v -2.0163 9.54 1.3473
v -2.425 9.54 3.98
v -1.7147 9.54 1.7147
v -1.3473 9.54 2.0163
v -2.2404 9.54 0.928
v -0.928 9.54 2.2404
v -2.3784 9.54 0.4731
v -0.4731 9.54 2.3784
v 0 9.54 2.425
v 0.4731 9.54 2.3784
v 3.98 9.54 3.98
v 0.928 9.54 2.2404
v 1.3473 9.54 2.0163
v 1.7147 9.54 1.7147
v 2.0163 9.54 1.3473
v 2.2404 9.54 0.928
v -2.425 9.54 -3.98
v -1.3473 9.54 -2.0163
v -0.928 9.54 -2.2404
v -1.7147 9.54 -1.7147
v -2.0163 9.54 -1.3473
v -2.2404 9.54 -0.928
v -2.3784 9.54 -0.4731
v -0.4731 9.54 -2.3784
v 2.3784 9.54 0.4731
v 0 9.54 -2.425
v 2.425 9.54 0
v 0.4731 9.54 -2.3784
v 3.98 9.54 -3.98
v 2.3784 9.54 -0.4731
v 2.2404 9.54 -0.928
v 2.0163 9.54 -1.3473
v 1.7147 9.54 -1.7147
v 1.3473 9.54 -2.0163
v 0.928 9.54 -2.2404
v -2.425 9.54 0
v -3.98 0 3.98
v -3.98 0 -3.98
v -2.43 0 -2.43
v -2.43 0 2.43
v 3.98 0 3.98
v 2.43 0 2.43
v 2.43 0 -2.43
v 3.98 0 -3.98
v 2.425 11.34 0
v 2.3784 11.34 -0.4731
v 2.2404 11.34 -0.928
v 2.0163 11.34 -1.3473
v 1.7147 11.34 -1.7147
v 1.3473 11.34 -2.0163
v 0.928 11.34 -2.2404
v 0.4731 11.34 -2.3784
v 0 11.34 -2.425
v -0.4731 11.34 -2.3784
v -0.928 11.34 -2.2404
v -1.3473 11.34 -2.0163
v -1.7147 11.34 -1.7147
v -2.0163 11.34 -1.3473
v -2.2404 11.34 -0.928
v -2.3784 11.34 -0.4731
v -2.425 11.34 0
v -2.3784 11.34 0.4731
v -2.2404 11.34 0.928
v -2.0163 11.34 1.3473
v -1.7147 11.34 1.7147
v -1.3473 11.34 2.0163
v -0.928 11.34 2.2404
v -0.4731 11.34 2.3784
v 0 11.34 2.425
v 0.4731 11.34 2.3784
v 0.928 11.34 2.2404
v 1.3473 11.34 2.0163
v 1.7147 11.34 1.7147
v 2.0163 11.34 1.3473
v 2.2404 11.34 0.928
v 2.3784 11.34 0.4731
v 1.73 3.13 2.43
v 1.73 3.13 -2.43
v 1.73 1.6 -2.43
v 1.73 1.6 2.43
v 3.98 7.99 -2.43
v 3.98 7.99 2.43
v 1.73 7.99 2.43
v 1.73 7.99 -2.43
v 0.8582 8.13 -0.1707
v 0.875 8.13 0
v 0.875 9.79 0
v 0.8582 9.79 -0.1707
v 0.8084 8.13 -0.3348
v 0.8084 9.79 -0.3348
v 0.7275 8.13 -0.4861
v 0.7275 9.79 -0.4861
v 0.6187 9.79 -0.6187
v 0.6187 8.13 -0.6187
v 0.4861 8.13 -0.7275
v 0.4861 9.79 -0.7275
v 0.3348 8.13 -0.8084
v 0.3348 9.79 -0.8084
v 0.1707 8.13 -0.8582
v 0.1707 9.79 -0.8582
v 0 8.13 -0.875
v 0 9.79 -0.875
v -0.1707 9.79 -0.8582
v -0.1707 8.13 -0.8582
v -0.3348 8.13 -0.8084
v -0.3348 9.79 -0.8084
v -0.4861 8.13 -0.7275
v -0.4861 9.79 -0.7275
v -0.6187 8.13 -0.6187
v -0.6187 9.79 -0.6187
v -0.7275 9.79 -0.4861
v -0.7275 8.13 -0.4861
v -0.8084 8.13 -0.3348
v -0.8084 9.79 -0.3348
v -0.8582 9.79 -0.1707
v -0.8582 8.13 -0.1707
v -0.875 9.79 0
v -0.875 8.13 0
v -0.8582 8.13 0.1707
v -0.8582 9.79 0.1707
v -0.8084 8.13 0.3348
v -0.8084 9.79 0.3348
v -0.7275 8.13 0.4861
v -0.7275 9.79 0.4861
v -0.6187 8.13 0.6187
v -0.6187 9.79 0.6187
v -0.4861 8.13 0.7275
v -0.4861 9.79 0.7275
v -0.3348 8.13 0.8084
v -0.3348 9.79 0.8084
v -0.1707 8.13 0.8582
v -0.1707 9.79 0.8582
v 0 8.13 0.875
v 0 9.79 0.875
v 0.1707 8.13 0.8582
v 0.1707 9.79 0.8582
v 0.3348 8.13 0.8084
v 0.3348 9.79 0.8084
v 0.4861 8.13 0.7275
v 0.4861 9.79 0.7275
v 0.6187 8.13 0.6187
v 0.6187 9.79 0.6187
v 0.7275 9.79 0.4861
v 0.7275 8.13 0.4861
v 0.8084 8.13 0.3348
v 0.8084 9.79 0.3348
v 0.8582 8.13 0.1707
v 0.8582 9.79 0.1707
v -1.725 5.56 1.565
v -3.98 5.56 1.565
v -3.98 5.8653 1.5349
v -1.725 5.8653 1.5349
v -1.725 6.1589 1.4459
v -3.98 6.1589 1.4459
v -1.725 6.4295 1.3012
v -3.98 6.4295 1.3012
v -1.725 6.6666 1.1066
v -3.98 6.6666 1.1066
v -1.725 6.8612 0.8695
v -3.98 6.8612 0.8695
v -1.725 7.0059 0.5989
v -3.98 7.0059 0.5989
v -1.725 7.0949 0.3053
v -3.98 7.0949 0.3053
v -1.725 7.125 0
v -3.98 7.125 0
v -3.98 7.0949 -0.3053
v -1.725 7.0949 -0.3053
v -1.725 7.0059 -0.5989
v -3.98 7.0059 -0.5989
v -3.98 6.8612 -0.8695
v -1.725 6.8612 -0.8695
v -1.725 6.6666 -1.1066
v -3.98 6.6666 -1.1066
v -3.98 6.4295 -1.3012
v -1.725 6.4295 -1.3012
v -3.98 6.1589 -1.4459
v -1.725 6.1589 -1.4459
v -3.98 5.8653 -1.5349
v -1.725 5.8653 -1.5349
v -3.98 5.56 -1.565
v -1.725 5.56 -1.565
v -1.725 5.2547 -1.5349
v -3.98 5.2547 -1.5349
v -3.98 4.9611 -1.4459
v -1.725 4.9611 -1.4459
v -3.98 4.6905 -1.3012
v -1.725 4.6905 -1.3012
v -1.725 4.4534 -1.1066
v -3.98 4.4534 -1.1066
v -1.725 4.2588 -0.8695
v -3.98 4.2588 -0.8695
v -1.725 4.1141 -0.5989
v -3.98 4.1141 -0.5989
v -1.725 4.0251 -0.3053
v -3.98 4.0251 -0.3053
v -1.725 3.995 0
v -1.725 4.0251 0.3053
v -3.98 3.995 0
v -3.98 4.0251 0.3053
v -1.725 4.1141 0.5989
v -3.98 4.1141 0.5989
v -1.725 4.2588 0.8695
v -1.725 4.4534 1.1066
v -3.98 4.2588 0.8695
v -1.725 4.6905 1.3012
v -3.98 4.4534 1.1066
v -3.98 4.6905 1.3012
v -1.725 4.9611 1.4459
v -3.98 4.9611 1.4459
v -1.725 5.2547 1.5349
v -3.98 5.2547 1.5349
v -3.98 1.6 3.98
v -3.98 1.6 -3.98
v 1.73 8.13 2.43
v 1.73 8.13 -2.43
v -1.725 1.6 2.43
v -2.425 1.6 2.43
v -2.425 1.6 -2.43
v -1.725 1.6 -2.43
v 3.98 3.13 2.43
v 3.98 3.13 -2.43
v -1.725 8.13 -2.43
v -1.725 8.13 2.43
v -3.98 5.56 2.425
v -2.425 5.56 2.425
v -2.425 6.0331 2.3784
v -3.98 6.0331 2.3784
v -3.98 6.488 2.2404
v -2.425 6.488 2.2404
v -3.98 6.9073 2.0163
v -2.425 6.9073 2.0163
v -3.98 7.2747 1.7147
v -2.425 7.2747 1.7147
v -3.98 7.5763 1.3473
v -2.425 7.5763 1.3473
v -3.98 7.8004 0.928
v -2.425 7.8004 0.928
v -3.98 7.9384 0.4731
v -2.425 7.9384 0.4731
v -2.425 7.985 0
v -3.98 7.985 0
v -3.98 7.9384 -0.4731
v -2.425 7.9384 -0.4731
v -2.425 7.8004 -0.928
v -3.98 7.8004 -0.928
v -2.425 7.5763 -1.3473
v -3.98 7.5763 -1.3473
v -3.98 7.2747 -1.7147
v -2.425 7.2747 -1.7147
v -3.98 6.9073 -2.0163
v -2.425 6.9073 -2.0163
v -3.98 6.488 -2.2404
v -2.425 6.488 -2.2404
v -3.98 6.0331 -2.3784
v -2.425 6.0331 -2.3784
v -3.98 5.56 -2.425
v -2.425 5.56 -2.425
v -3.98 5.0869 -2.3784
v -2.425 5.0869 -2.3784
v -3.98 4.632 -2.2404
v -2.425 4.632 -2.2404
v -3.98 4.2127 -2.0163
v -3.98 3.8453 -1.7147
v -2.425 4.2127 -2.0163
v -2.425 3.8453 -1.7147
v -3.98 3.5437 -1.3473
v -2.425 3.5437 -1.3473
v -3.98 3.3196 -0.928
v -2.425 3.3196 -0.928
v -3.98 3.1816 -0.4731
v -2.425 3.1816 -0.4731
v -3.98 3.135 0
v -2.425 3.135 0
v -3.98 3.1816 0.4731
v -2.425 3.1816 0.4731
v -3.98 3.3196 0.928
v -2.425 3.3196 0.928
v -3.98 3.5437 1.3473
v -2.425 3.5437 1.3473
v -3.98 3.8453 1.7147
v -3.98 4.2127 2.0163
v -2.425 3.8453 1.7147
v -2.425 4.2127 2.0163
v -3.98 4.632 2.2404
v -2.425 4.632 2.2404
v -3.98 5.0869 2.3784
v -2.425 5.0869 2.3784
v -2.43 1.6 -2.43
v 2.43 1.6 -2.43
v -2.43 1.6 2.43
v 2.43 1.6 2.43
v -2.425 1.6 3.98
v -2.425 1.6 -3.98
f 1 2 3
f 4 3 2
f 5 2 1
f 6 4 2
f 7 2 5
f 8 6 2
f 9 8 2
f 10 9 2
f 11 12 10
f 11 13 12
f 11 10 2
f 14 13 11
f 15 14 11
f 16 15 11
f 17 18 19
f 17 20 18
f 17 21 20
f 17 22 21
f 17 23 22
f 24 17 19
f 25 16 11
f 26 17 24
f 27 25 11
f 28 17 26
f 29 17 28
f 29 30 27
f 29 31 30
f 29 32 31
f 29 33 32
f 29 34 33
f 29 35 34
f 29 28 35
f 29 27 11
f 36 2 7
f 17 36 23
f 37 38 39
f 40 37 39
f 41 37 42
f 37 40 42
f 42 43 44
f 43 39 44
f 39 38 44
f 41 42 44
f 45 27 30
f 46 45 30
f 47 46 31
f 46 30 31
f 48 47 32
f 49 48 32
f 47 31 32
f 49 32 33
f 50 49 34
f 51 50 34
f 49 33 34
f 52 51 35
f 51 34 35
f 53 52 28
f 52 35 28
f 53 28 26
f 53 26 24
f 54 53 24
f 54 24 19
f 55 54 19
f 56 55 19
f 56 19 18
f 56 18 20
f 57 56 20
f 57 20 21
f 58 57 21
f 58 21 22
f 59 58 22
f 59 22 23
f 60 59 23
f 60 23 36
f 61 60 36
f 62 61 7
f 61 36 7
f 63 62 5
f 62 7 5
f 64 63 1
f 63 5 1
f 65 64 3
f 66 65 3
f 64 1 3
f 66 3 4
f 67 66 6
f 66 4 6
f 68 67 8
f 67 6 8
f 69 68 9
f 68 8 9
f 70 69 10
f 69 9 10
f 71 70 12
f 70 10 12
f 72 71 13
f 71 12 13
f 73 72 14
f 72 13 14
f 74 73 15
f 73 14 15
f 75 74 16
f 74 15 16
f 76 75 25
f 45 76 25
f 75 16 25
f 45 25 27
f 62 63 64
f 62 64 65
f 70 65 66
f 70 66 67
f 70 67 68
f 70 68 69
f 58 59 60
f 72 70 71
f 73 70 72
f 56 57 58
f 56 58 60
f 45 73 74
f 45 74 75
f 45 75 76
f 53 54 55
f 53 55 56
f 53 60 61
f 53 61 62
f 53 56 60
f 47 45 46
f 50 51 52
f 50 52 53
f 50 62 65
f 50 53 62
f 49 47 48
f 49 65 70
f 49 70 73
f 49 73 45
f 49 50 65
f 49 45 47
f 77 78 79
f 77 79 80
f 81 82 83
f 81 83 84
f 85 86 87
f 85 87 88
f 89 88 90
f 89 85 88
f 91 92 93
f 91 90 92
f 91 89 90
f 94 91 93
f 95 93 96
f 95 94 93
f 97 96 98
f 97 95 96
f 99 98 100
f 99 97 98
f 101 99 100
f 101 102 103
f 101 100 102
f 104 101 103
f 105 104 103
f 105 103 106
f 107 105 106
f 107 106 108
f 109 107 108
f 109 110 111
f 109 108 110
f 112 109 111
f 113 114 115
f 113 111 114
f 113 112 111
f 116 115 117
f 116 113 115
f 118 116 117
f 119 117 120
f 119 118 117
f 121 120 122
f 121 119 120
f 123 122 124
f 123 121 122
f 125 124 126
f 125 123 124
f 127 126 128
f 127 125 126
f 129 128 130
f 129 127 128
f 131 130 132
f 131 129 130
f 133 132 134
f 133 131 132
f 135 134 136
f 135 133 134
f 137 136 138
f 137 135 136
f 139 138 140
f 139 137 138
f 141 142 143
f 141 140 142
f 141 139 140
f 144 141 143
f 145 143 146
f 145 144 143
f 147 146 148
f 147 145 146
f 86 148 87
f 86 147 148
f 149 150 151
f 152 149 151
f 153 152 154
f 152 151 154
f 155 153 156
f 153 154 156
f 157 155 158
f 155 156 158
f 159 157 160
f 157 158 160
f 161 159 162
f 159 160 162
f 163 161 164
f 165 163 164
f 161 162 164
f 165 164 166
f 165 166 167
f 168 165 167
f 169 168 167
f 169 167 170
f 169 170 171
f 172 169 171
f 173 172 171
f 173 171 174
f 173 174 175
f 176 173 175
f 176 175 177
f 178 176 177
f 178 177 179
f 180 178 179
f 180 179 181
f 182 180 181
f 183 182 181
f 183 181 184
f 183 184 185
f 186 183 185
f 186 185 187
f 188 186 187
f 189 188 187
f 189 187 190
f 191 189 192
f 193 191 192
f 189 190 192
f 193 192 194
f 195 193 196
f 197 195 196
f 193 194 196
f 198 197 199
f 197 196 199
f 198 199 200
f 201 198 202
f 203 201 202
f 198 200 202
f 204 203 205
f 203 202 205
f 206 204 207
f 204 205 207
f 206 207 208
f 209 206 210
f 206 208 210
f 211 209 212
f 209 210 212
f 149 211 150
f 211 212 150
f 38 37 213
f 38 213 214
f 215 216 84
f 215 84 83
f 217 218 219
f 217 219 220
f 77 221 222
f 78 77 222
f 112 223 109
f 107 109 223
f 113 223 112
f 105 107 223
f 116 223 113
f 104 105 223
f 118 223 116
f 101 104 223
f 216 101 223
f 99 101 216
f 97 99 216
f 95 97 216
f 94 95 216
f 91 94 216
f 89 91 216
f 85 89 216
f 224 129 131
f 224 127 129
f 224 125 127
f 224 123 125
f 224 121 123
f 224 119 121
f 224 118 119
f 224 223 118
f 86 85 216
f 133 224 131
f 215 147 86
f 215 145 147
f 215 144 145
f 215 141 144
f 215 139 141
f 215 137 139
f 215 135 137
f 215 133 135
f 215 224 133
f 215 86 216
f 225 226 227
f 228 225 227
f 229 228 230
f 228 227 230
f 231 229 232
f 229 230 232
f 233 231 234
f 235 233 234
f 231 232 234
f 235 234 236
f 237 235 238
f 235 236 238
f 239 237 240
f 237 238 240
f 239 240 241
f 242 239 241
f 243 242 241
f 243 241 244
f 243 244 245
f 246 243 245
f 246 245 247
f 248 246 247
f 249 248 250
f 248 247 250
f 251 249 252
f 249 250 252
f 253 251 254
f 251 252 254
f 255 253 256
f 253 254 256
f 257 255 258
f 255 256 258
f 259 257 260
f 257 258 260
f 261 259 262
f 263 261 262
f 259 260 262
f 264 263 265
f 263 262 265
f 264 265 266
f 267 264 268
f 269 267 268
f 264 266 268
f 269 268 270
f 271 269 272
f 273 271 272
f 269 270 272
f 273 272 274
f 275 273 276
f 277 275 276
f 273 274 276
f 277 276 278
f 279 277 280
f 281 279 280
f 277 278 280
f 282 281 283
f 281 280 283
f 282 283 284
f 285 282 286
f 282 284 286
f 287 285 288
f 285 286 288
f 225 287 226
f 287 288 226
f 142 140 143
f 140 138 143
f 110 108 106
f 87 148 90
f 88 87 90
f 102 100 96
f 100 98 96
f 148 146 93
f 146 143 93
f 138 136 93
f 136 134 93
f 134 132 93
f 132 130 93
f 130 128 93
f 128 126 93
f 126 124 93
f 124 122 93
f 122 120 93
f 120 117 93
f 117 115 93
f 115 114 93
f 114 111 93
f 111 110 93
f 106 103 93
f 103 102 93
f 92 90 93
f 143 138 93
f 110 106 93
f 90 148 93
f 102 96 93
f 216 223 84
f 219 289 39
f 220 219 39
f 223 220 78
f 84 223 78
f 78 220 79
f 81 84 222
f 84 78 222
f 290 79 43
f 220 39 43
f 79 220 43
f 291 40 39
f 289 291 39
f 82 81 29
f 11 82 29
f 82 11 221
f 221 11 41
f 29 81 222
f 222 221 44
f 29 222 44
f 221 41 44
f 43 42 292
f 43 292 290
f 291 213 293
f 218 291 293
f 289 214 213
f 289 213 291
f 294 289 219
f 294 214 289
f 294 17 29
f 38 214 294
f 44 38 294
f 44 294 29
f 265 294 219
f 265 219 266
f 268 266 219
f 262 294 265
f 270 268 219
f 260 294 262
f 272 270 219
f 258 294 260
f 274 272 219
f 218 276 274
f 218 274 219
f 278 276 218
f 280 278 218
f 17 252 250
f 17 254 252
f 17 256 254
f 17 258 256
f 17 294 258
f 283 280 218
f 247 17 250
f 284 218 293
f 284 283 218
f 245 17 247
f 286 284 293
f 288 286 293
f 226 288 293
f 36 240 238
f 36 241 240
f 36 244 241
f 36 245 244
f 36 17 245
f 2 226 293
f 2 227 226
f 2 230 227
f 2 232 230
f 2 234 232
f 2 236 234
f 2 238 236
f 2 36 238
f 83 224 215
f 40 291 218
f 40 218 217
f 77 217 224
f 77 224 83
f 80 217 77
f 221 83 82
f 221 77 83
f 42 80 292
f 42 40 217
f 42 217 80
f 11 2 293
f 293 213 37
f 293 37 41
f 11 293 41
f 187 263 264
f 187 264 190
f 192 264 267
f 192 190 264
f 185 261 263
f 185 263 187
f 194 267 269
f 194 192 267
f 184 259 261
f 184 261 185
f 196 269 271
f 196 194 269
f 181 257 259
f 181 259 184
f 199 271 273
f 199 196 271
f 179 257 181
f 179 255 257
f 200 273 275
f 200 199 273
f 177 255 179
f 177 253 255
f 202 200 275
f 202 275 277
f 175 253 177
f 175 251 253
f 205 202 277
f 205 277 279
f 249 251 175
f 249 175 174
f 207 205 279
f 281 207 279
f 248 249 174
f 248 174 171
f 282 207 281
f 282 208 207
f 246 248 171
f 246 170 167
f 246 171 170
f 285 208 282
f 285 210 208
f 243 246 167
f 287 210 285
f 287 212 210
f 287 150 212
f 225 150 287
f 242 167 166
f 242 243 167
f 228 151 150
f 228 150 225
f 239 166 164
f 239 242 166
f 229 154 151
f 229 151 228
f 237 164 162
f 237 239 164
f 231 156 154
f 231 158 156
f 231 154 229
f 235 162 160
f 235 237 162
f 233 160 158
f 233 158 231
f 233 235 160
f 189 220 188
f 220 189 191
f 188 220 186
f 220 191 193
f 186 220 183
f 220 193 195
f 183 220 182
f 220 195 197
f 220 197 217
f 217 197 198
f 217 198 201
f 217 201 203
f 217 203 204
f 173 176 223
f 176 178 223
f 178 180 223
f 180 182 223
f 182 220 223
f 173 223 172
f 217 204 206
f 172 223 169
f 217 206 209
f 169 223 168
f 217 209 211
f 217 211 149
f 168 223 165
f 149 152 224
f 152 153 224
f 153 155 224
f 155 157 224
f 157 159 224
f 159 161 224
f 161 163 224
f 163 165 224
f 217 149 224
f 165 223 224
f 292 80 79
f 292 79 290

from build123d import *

# Parameters (mm, degrees)
SKETCH1_W      = 7.96
SKETCH1_H      = 7.96
EXTRUDE1_DEPTH = 9.54
SKETCH2_R      = 2.425
EXTRUDE2_DEPTH = 1.8
SHELL1_T       = -1.55
SKETCH3_W      = 4.86
SKETCH3_H      = 4.86
EXTRUDE3_DEPTH = 0.14
SKETCH5_W      = 1.555
SKETCH5_H      = 7.96
EXTRUDE5_DEPTH = 7.94
SKETCH7_W      = 0.7
SKETCH7_H      = 4.86
EXTRUDE6_DEPTH = 6.53
EXTRUDE7_REACH = 9.96
SKETCH4_W      = 4.86
SKETCH4_H      = 4.86
SKETCH8_R      = 2.425
EXTRUDE8_DEPTH = 1.555
SKETCH9_R      = 1.565
EXTRUDE9_DEPTH = 8.96


with BuildPart() as part:
    # Sketch1 → Extrude1 (new body)
    with BuildSketch(Plane(origin=(0, 0, 0), x_dir=(1, 0, 0), z_dir=(0, 1, 0))):
        Rectangle(SKETCH1_W, SKETCH1_H)
    extrude(amount=EXTRUDE1_DEPTH)

    # Sketch2 → Extrude2 (add)
    with BuildSketch(Plane(origin=(0, 9.54, 0), x_dir=(1, 0, 0), z_dir=(0, 1, 0))):
        Circle(SKETCH2_R)
    extrude(amount=EXTRUDE2_DEPTH)

    # Shell1
    shell1_openings = [part.faces().sort_by_distance(p)[0] for p in [
        (0, 0, 0),
    ]]
    offset(amount=SHELL1_T, openings=shell1_openings, kind=Kind.INTERSECTION)

    # Sketch3 → Extrude3 (cut)
    with BuildSketch(Plane.XZ.offset(-7.99)):
        Rectangle(SKETCH3_W, SKETCH3_H)
    extrude(amount=-EXTRUDE3_DEPTH, mode=Mode.SUBTRACT)

    # Sketch5 → Extrude5 (cut)
    with BuildSketch(Plane(origin=(0, 9.54, 0), x_dir=(1, 0, 0), z_dir=(0, 1, 0))):
        with Locations((-3.2025, 0)):
            Rectangle(SKETCH5_W, SKETCH5_H)
    extrude(amount=-EXTRUDE5_DEPTH, mode=Mode.SUBTRACT)

    # Sketch7 → Extrude6 (add)
    with BuildSketch(Plane.XZ.offset(-8.13)):
        with Locations((-2.075, 0)):
            Rectangle(SKETCH7_W, SKETCH7_H)
        with Locations((2.08, 0)):
            Rectangle(SKETCH7_W, SKETCH7_H)
    extrude(amount=EXTRUDE6_DEPTH)

    # Sketch4 → Extrude7 (cut, up to next)
    with BuildSketch(Plane(origin=(3.98, 0, 0), x_dir=(0, 0, -1), z_dir=(1, 0, 0)), mode=Mode.PRIVATE) as extrude7_sk1:
        with Locations((0, 5.56)):
            Rectangle(SKETCH4_W, SKETCH4_H)
    extrude7_tool1 = extrude(extrude7_sk1.sketch, amount=-EXTRUDE7_REACH, mode=Mode.PRIVATE) & part.part
    add(extrude7_tool1.solids().sort_by_distance((3.98, 5.56, 0))[0], mode=Mode.SUBTRACT)

    # Sketch8 → Extrude8 (add)
    with BuildSketch(Plane.ZY.offset(2.425)):
        with Locations((0, 5.56)):
            Circle(SKETCH8_R)
    extrude(amount=EXTRUDE8_DEPTH)

    # Sketch9 → Extrude9 (cut, through all)
    with BuildSketch(Plane.ZY.offset(3.98)):
        with Locations((0, 5.56)):
            Circle(SKETCH9_R)
    extrude(amount=-EXTRUDE9_DEPTH, mode=Mode.SUBTRACT)


solid = part.part
